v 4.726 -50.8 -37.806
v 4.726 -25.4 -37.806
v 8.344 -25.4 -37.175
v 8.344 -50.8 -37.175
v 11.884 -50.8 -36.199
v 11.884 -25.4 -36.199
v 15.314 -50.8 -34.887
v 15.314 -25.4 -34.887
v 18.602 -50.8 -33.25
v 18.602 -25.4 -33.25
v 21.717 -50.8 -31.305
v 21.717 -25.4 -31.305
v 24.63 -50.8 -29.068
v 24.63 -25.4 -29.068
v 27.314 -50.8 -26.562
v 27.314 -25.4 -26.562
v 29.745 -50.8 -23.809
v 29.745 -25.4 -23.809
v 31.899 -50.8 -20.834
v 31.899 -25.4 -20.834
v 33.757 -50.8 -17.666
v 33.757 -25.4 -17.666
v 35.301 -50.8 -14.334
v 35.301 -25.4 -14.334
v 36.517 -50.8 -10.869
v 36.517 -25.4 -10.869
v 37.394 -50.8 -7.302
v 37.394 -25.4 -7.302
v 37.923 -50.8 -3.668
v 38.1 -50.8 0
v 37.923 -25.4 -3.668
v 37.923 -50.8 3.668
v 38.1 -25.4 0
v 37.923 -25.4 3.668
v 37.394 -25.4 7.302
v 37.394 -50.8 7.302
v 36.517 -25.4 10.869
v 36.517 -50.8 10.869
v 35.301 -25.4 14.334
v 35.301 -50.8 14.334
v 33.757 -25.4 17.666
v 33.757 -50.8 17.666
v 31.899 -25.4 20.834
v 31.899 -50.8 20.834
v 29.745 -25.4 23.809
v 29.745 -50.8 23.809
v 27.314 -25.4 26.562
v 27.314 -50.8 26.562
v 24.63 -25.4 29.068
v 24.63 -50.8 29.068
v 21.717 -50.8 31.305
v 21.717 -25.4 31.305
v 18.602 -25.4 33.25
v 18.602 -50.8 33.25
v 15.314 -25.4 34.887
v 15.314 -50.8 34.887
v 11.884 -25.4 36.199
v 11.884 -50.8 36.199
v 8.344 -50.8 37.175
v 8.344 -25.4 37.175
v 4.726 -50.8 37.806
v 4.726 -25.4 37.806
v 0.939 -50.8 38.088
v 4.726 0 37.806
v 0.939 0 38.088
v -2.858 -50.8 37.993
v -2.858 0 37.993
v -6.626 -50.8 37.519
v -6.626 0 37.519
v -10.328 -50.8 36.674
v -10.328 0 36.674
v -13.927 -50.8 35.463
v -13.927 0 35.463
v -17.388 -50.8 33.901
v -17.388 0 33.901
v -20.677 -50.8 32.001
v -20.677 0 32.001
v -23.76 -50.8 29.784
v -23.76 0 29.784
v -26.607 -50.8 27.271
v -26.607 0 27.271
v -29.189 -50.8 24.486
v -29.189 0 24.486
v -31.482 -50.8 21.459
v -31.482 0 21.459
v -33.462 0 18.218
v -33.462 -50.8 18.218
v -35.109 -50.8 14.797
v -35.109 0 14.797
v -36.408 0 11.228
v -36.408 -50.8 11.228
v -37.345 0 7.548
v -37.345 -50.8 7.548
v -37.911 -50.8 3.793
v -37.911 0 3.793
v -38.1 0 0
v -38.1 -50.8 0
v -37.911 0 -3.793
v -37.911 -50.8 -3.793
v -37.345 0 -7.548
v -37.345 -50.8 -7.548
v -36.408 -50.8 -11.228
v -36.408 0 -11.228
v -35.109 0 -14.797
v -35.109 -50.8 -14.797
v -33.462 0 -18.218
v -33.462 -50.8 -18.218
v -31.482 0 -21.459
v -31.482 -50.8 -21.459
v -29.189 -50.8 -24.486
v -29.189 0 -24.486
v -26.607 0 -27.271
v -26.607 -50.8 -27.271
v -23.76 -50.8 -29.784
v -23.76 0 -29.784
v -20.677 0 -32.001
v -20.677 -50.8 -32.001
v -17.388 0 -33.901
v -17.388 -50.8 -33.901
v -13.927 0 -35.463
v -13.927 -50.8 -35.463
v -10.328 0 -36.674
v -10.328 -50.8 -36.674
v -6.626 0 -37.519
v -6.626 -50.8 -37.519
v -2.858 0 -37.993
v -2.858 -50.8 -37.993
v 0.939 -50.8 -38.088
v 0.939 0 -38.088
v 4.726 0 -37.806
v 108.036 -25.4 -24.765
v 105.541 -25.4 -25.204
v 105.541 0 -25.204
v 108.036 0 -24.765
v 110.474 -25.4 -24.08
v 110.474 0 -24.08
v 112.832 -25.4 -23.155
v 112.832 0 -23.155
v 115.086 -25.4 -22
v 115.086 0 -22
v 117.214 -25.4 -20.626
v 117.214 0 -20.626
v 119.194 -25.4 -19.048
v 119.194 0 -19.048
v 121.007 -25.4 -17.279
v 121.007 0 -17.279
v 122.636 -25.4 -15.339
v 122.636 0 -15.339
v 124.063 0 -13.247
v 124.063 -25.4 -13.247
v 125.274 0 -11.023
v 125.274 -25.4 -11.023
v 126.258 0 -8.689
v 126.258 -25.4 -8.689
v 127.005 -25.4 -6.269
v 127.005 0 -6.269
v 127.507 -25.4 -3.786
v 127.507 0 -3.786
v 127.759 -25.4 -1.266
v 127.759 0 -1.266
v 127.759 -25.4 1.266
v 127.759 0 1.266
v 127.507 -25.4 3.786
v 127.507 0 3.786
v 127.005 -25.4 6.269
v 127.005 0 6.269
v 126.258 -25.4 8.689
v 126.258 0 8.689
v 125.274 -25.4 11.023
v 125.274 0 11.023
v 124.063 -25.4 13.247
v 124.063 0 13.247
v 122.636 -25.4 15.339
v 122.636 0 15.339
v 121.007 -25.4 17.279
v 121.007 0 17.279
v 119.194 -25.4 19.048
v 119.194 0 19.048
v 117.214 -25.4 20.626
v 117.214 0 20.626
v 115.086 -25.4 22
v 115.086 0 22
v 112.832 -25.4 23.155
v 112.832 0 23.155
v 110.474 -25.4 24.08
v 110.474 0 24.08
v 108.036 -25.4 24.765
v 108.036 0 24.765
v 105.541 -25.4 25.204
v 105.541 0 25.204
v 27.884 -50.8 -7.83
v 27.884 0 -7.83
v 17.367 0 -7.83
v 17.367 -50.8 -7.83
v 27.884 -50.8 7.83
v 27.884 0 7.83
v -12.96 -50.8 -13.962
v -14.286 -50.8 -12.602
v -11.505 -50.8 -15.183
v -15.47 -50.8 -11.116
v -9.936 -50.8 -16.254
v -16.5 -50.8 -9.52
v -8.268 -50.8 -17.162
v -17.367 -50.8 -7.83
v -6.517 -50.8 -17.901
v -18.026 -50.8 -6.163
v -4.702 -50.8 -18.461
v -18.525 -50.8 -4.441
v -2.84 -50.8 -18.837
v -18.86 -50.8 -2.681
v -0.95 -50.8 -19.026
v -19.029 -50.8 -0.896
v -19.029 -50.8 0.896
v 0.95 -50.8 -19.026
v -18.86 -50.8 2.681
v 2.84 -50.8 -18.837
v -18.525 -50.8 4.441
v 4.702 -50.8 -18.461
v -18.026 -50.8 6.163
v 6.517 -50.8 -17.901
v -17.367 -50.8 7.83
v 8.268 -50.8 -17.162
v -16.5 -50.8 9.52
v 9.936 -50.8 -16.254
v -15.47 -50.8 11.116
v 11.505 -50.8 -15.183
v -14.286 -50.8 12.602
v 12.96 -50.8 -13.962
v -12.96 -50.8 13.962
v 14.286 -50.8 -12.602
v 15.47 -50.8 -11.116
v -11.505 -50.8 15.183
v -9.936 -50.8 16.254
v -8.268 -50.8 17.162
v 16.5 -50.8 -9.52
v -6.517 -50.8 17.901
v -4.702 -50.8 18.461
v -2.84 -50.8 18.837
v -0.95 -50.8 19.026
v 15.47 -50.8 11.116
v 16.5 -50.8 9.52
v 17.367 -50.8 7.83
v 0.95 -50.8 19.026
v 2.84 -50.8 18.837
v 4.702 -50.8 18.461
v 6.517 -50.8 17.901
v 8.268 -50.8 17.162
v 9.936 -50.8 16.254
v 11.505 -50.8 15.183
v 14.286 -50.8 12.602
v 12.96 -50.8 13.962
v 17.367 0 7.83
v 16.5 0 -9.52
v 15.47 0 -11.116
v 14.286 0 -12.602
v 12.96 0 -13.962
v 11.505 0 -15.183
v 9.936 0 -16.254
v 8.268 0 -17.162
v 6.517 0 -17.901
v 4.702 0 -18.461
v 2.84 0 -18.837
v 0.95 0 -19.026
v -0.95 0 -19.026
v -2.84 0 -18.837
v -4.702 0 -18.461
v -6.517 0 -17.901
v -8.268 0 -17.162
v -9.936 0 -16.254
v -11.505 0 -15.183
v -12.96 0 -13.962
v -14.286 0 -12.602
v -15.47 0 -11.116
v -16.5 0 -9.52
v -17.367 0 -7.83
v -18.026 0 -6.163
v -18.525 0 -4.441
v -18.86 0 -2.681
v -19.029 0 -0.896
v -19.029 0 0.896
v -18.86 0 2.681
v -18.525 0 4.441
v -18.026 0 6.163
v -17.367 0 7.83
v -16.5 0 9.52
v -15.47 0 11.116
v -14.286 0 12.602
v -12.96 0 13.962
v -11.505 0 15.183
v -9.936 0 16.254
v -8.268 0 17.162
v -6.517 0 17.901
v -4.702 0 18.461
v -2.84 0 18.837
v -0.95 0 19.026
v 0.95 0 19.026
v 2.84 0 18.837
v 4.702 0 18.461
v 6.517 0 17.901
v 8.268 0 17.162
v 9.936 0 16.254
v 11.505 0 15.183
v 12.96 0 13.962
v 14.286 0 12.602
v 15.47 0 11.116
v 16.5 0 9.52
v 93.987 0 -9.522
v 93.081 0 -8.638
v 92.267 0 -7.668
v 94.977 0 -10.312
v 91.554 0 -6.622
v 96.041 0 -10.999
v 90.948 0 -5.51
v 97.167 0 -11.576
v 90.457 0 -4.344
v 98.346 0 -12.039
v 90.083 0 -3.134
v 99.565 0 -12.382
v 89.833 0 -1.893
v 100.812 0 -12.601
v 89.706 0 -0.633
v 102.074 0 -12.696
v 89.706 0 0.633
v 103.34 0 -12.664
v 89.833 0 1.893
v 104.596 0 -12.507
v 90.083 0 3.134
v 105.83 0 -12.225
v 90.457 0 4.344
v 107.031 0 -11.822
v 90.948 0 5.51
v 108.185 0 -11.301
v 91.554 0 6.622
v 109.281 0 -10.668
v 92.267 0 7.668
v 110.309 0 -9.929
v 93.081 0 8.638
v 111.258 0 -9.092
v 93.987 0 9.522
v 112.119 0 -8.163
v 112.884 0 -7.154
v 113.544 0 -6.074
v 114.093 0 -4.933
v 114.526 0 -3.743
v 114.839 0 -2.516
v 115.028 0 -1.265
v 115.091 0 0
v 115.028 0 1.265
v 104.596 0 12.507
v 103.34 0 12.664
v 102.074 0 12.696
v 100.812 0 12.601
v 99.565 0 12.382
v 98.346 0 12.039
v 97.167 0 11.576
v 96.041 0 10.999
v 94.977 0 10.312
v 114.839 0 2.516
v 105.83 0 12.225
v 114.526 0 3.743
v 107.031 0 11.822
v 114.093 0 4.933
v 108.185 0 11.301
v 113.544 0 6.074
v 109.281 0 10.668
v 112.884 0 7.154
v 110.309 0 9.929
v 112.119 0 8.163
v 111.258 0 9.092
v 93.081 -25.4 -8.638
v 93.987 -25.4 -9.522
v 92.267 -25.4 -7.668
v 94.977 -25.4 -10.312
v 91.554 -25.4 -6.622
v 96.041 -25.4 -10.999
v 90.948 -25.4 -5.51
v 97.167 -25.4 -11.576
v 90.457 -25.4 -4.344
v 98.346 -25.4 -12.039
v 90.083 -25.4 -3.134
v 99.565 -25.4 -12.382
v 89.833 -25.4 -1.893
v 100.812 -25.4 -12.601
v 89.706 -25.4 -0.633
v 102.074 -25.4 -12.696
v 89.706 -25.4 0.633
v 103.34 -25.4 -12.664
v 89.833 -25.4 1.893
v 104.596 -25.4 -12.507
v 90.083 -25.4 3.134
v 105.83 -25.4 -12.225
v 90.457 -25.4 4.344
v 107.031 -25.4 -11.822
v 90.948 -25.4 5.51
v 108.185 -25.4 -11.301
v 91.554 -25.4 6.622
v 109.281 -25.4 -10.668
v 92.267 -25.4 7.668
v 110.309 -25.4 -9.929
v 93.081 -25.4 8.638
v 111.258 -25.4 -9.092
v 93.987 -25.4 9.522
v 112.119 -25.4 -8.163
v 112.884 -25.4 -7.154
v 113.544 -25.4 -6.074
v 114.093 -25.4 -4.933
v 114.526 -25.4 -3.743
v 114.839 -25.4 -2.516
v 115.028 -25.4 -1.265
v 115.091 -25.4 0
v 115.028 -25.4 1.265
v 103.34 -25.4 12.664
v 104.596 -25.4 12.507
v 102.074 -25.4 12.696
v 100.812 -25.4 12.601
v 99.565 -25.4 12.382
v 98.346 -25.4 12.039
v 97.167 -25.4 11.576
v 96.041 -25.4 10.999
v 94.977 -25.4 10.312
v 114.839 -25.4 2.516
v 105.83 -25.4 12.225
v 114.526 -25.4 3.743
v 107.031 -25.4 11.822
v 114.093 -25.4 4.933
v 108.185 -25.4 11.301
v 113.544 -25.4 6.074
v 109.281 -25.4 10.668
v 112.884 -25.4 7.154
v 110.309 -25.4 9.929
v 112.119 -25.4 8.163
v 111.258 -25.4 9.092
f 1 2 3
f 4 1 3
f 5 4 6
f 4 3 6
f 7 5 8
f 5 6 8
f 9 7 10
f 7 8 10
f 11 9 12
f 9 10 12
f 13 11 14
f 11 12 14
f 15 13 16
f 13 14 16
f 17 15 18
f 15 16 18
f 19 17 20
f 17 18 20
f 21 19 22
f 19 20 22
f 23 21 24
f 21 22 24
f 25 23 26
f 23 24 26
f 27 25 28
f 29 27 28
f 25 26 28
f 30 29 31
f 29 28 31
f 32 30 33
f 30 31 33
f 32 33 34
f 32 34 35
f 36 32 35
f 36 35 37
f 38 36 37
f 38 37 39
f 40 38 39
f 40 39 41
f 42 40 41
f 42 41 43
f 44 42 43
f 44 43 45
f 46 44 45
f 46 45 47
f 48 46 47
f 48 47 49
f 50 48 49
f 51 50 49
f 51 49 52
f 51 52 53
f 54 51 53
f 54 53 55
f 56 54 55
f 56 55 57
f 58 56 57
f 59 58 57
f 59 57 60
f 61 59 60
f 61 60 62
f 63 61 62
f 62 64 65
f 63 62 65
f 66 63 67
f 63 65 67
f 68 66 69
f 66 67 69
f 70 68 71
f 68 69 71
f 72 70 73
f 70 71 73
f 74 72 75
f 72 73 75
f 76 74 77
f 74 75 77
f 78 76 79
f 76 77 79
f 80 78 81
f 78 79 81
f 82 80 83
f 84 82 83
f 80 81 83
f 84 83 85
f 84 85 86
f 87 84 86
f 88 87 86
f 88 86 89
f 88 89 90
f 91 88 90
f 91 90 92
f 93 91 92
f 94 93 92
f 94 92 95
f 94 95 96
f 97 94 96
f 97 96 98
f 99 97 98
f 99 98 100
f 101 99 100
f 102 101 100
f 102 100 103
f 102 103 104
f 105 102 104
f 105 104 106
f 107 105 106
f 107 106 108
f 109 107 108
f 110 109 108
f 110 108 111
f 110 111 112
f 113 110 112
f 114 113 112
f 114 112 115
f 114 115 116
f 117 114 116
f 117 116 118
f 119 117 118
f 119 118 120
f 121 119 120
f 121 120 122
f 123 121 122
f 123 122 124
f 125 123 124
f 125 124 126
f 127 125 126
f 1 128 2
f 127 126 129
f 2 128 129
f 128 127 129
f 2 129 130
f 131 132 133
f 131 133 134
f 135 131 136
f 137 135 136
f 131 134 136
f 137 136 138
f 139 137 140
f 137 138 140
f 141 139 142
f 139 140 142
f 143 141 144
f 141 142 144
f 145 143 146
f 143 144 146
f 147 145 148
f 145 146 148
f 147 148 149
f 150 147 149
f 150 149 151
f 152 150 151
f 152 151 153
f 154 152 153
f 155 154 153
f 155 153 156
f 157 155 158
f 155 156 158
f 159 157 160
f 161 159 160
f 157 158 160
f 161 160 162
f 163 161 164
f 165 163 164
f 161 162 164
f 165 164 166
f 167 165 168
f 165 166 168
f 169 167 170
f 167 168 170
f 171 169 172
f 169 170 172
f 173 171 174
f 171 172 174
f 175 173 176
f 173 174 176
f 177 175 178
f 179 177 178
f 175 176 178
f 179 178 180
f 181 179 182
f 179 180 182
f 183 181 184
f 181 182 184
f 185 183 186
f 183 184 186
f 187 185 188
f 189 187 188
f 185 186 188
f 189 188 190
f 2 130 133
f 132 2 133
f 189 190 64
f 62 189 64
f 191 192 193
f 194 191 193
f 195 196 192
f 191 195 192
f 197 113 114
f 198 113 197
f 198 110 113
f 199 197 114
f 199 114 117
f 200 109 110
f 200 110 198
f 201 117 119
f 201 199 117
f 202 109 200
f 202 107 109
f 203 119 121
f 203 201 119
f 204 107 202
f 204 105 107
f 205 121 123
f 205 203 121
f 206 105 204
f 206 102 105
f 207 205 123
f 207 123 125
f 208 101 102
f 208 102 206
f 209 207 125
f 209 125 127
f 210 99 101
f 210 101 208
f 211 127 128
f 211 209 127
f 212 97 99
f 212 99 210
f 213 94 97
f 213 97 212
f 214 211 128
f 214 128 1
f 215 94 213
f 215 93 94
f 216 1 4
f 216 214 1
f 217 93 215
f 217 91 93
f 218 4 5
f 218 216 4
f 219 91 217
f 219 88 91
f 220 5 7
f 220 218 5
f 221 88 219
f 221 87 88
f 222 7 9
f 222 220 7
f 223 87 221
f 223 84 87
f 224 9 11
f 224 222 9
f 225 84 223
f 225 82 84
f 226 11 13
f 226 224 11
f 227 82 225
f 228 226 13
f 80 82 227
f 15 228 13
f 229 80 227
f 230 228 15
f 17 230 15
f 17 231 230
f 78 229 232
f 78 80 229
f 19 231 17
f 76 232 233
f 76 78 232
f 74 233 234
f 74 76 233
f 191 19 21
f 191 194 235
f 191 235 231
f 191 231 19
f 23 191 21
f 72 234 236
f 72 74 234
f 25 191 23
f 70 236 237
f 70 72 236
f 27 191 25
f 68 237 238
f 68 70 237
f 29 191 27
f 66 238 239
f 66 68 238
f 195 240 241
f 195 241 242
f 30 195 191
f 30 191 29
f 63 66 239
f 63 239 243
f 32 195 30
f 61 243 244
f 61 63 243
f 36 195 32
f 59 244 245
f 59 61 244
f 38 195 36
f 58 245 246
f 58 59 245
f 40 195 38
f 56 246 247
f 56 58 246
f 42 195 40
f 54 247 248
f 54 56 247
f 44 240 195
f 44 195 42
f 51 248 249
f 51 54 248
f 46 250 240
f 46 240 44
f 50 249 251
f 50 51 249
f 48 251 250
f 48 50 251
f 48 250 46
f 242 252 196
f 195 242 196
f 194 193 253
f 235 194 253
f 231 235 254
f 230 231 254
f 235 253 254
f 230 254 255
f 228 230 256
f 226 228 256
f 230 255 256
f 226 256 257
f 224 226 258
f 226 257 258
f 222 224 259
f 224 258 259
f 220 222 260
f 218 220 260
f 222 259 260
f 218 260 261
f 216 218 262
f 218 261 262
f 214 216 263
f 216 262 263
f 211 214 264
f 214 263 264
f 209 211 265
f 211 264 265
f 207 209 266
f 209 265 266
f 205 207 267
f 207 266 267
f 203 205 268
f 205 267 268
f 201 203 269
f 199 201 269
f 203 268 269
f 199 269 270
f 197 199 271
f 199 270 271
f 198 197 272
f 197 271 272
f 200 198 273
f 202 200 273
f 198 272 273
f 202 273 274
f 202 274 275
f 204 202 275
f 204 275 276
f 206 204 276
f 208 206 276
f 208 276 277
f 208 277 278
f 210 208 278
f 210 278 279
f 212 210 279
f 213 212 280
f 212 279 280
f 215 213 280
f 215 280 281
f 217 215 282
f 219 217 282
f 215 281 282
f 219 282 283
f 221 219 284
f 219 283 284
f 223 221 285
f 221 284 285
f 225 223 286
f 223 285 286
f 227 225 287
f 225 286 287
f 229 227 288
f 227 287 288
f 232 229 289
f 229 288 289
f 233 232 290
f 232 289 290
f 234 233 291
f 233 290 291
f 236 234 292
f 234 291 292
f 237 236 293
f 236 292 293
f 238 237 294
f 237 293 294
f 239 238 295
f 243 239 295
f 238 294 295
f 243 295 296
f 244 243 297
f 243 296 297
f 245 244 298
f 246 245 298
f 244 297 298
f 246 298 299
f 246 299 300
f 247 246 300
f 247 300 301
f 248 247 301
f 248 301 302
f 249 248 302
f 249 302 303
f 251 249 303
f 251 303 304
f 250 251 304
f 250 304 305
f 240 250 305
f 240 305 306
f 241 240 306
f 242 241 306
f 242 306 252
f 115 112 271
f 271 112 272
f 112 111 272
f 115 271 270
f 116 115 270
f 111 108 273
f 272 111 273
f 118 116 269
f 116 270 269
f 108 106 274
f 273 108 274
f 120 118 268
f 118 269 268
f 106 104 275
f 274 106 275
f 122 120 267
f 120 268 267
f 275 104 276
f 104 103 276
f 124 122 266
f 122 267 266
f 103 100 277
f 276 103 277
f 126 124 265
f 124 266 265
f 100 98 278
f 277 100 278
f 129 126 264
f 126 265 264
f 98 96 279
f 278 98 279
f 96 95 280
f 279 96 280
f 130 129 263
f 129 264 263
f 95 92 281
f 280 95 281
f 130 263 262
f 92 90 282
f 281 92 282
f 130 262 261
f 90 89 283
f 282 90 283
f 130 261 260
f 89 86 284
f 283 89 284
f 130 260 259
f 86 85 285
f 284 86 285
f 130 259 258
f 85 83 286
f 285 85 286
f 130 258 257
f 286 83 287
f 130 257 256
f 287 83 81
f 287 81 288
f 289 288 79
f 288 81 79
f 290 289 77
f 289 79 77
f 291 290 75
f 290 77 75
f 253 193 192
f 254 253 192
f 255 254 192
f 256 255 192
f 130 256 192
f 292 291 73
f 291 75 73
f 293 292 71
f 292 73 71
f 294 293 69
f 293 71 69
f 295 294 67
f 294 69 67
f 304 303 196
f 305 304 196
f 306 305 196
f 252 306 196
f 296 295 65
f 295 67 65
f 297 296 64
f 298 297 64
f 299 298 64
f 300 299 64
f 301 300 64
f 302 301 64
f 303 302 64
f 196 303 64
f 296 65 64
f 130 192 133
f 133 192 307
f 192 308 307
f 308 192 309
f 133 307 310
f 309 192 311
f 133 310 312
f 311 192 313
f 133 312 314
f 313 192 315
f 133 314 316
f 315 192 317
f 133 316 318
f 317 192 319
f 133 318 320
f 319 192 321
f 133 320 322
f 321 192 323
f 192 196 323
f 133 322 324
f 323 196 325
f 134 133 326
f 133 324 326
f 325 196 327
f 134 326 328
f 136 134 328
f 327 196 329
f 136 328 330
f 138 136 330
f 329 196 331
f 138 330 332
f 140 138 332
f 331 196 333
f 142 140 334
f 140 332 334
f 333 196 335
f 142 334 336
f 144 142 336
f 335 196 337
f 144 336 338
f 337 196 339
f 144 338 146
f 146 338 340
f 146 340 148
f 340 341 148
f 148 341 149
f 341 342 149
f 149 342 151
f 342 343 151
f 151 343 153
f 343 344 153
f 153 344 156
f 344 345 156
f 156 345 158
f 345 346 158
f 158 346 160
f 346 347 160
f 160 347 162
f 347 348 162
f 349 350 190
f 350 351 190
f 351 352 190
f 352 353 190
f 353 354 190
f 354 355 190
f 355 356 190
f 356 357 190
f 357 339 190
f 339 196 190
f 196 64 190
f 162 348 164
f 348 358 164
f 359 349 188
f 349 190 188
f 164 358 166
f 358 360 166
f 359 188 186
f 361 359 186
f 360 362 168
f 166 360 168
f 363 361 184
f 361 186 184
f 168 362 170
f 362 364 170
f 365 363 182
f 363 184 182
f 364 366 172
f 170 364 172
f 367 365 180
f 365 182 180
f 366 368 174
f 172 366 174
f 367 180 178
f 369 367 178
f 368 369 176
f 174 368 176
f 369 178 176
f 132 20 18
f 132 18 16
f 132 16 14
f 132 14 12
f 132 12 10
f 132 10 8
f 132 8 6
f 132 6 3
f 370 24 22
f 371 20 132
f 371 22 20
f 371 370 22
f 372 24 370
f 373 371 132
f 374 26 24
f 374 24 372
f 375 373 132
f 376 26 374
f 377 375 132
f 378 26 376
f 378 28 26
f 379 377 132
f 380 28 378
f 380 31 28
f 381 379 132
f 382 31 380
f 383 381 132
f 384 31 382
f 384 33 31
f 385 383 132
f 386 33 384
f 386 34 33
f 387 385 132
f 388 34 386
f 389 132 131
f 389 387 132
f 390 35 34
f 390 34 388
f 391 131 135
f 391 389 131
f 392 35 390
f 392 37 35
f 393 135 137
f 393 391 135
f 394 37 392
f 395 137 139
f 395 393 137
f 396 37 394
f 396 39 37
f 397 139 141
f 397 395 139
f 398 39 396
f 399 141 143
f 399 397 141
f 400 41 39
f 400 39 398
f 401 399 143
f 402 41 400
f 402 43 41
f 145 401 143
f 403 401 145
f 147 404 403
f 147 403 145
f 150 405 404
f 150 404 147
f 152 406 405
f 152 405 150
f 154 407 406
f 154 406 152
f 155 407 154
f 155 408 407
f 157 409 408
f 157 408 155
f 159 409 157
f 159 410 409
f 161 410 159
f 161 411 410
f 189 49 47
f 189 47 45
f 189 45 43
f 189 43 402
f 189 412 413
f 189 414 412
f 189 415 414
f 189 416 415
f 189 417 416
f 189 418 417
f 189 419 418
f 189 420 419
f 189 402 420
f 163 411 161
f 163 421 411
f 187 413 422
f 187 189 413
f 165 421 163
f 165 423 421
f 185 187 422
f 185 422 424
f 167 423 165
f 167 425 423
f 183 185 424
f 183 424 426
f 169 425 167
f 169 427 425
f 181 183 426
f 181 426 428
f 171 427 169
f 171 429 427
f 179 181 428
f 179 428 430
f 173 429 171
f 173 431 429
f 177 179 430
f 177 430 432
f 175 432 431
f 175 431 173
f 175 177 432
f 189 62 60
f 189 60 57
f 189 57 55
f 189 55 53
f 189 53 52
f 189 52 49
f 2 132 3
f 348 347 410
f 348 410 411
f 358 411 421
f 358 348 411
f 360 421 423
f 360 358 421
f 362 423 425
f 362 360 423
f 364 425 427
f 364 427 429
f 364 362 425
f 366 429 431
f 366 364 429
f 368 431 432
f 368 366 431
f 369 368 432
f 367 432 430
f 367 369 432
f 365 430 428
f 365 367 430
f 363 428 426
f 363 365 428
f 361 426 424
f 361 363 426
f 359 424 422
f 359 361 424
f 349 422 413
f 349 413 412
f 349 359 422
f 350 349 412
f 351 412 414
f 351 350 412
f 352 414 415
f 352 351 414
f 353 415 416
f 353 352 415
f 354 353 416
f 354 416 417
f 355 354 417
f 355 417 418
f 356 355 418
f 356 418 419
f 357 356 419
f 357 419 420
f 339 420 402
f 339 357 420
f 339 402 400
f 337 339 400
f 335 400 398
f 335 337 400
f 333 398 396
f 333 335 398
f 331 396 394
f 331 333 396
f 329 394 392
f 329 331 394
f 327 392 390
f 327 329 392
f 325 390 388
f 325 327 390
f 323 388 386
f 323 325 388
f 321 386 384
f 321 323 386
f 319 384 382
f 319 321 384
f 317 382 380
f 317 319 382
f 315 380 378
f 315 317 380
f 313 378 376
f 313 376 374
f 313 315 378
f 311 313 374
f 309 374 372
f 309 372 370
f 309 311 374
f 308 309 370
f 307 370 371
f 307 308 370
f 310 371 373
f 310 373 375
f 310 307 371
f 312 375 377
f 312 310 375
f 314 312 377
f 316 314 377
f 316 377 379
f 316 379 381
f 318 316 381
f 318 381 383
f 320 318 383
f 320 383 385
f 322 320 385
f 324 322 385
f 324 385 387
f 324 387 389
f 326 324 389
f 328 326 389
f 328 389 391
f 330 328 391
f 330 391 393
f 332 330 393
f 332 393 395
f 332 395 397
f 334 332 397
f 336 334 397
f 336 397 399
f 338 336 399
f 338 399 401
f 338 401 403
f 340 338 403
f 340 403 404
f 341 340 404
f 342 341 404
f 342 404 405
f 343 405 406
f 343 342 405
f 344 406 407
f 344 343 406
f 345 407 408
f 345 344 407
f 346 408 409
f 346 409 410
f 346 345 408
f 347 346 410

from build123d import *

# Parameters (mm, degrees)
F0_R     = 12.7
F1_DEPTH = 25.4
F2_DEPTH = 50.8


# Not quite as in the source:
# - a feature names something its author has since deleted; it is built from what else it names


with BuildPart() as f1:
    # F0 (on Front) → F1 (new body)
    with BuildSketch(Plane.XZ):
        with BuildLine():
            ThreePointArc((4.7257233878, 37.8057871028), (28.5627384986, 25.2146776593), (38.1, 0))
            ThreePointArc((38.1, 0), (28.5627384986, -25.2146776593), (4.7257233878, -37.8057871028))
            Line((4.7257233878, -37.8057871028), (105.541155662, -25.2038580685))
            ThreePointArc((105.541155662, -25.2038580685), (76.9906734034, 0), (105.541155662, 25.2038580685))
            Line((105.541155662, 25.2038580685), (4.7257233878, 37.8057871028))
        make_face()
        with BuildLine():
            ThreePointArc((127.7906734034, 0), (121.4324990691, 16.8097851062), (105.541155662, 25.2038580685))
            ThreePointArc((105.541155662, 25.2038580685), (76.9906734034, 0), (105.541155662, -25.2038580685))
            ThreePointArc((105.541155662, -25.2038580685), (121.4324990691, -16.8097851062), (127.7906734034, 0))
        make_face()
        with Locations((102.3906734034, 0)):
            Circle(F0_R, mode=Mode.SUBTRACT)
        with BuildLine():
            ThreePointArc((4.7257233878, -37.8057871028), (28.5627384986, -25.2146776593), (38.1, 0))
            ThreePointArc((38.1, 0), (28.5627384986, 25.2146776593), (4.7257233878, 37.8057871028))
            ThreePointArc((4.7257233878, 37.8057871028), (-38.1, 0), (4.7257233878, -37.8057871028))
        make_face()
        with BuildLine():
            ThreePointArc((-17.3665807845, 7.8297108412), (0, 19.05), (17.3665807845, 7.8297108412))
            Line((17.3665807845, 7.8297108412), (27.8837817341, 7.8297108412))
            Line((27.8837817341, 7.8297108412), (27.8837817341, -7.8297108412))
            Line((27.8837817341, -7.8297108412), (17.3665807845, -7.8297108412))
            ThreePointArc((17.3665807845, -7.8297108412), (0, -19.05), (-17.3665807845, -7.8297108412))
            Line((-17.3665807845, -7.8297108412), (-22.9162182659, -7.8297108412))
            Line((-22.9162182659, -7.8297108412), (-22.9162182659, 0))
            Line((-22.9162182659, 0), (-22.9162182659, 7.8297108412))
            Line((-22.9162182659, 7.8297108412), (-17.3665807845, 7.8297108412))
        make_face(mode=Mode.SUBTRACT)
        with BuildLine():
            ThreePointArc((-17.3665807845, -7.8297108412), (-19.05, 0), (-17.3665807845, 7.8297108412))
            Line((-17.3665807845, 7.8297108412), (-22.9162182659, 7.8297108412))
            Line((-22.9162182659, 7.8297108412), (-22.9162182659, 0))
            Line((-22.9162182659, 0), (-22.9162182659, -7.8297108412))
            Line((-22.9162182659, -7.8297108412), (-17.3665807845, -7.8297108412))
        make_face()
    extrude(amount=F1_DEPTH)

    # F0 (on Front) → F2 (join)
    with BuildSketch(Plane.XZ):
        with BuildLine():
            ThreePointArc((4.7257233878, -37.8057871028), (28.5627384986, -25.2146776593), (38.1, 0))
            ThreePointArc((38.1, 0), (28.5627384986, 25.2146776593), (4.7257233878, 37.8057871028))
            ThreePointArc((4.7257233878, 37.8057871028), (-38.1, 0), (4.7257233878, -37.8057871028))
        make_face()
        with BuildLine():
            ThreePointArc((-17.3665807845, 7.8297108412), (0, 19.05), (17.3665807845, 7.8297108412))
            Line((17.3665807845, 7.8297108412), (27.8837817341, 7.8297108412))
            Line((27.8837817341, 7.8297108412), (27.8837817341, -7.8297108412))
            Line((27.8837817341, -7.8297108412), (17.3665807845, -7.8297108412))
            ThreePointArc((17.3665807845, -7.8297108412), (0, -19.05), (-17.3665807845, -7.8297108412))
            Line((-17.3665807845, -7.8297108412), (-22.9162182659, -7.8297108412))
            Line((-22.9162182659, -7.8297108412), (-22.9162182659, 0))
            Line((-22.9162182659, 0), (-22.9162182659, 7.8297108412))
            Line((-22.9162182659, 7.8297108412), (-17.3665807845, 7.8297108412))
        make_face(mode=Mode.SUBTRACT)
        with BuildLine():
            ThreePointArc((-17.3665807845, -7.8297108412), (-19.05, 0), (-17.3665807845, 7.8297108412))
            Line((-17.3665807845, 7.8297108412), (-22.9162182659, 7.8297108412))
            Line((-22.9162182659, 7.8297108412), (-22.9162182659, 0))
            Line((-22.9162182659, 0), (-22.9162182659, -7.8297108412))
            Line((-22.9162182659, -7.8297108412), (-17.3665807845, -7.8297108412))
        make_face()
    extrude(amount=F2_DEPTH)


solid = f1.part
